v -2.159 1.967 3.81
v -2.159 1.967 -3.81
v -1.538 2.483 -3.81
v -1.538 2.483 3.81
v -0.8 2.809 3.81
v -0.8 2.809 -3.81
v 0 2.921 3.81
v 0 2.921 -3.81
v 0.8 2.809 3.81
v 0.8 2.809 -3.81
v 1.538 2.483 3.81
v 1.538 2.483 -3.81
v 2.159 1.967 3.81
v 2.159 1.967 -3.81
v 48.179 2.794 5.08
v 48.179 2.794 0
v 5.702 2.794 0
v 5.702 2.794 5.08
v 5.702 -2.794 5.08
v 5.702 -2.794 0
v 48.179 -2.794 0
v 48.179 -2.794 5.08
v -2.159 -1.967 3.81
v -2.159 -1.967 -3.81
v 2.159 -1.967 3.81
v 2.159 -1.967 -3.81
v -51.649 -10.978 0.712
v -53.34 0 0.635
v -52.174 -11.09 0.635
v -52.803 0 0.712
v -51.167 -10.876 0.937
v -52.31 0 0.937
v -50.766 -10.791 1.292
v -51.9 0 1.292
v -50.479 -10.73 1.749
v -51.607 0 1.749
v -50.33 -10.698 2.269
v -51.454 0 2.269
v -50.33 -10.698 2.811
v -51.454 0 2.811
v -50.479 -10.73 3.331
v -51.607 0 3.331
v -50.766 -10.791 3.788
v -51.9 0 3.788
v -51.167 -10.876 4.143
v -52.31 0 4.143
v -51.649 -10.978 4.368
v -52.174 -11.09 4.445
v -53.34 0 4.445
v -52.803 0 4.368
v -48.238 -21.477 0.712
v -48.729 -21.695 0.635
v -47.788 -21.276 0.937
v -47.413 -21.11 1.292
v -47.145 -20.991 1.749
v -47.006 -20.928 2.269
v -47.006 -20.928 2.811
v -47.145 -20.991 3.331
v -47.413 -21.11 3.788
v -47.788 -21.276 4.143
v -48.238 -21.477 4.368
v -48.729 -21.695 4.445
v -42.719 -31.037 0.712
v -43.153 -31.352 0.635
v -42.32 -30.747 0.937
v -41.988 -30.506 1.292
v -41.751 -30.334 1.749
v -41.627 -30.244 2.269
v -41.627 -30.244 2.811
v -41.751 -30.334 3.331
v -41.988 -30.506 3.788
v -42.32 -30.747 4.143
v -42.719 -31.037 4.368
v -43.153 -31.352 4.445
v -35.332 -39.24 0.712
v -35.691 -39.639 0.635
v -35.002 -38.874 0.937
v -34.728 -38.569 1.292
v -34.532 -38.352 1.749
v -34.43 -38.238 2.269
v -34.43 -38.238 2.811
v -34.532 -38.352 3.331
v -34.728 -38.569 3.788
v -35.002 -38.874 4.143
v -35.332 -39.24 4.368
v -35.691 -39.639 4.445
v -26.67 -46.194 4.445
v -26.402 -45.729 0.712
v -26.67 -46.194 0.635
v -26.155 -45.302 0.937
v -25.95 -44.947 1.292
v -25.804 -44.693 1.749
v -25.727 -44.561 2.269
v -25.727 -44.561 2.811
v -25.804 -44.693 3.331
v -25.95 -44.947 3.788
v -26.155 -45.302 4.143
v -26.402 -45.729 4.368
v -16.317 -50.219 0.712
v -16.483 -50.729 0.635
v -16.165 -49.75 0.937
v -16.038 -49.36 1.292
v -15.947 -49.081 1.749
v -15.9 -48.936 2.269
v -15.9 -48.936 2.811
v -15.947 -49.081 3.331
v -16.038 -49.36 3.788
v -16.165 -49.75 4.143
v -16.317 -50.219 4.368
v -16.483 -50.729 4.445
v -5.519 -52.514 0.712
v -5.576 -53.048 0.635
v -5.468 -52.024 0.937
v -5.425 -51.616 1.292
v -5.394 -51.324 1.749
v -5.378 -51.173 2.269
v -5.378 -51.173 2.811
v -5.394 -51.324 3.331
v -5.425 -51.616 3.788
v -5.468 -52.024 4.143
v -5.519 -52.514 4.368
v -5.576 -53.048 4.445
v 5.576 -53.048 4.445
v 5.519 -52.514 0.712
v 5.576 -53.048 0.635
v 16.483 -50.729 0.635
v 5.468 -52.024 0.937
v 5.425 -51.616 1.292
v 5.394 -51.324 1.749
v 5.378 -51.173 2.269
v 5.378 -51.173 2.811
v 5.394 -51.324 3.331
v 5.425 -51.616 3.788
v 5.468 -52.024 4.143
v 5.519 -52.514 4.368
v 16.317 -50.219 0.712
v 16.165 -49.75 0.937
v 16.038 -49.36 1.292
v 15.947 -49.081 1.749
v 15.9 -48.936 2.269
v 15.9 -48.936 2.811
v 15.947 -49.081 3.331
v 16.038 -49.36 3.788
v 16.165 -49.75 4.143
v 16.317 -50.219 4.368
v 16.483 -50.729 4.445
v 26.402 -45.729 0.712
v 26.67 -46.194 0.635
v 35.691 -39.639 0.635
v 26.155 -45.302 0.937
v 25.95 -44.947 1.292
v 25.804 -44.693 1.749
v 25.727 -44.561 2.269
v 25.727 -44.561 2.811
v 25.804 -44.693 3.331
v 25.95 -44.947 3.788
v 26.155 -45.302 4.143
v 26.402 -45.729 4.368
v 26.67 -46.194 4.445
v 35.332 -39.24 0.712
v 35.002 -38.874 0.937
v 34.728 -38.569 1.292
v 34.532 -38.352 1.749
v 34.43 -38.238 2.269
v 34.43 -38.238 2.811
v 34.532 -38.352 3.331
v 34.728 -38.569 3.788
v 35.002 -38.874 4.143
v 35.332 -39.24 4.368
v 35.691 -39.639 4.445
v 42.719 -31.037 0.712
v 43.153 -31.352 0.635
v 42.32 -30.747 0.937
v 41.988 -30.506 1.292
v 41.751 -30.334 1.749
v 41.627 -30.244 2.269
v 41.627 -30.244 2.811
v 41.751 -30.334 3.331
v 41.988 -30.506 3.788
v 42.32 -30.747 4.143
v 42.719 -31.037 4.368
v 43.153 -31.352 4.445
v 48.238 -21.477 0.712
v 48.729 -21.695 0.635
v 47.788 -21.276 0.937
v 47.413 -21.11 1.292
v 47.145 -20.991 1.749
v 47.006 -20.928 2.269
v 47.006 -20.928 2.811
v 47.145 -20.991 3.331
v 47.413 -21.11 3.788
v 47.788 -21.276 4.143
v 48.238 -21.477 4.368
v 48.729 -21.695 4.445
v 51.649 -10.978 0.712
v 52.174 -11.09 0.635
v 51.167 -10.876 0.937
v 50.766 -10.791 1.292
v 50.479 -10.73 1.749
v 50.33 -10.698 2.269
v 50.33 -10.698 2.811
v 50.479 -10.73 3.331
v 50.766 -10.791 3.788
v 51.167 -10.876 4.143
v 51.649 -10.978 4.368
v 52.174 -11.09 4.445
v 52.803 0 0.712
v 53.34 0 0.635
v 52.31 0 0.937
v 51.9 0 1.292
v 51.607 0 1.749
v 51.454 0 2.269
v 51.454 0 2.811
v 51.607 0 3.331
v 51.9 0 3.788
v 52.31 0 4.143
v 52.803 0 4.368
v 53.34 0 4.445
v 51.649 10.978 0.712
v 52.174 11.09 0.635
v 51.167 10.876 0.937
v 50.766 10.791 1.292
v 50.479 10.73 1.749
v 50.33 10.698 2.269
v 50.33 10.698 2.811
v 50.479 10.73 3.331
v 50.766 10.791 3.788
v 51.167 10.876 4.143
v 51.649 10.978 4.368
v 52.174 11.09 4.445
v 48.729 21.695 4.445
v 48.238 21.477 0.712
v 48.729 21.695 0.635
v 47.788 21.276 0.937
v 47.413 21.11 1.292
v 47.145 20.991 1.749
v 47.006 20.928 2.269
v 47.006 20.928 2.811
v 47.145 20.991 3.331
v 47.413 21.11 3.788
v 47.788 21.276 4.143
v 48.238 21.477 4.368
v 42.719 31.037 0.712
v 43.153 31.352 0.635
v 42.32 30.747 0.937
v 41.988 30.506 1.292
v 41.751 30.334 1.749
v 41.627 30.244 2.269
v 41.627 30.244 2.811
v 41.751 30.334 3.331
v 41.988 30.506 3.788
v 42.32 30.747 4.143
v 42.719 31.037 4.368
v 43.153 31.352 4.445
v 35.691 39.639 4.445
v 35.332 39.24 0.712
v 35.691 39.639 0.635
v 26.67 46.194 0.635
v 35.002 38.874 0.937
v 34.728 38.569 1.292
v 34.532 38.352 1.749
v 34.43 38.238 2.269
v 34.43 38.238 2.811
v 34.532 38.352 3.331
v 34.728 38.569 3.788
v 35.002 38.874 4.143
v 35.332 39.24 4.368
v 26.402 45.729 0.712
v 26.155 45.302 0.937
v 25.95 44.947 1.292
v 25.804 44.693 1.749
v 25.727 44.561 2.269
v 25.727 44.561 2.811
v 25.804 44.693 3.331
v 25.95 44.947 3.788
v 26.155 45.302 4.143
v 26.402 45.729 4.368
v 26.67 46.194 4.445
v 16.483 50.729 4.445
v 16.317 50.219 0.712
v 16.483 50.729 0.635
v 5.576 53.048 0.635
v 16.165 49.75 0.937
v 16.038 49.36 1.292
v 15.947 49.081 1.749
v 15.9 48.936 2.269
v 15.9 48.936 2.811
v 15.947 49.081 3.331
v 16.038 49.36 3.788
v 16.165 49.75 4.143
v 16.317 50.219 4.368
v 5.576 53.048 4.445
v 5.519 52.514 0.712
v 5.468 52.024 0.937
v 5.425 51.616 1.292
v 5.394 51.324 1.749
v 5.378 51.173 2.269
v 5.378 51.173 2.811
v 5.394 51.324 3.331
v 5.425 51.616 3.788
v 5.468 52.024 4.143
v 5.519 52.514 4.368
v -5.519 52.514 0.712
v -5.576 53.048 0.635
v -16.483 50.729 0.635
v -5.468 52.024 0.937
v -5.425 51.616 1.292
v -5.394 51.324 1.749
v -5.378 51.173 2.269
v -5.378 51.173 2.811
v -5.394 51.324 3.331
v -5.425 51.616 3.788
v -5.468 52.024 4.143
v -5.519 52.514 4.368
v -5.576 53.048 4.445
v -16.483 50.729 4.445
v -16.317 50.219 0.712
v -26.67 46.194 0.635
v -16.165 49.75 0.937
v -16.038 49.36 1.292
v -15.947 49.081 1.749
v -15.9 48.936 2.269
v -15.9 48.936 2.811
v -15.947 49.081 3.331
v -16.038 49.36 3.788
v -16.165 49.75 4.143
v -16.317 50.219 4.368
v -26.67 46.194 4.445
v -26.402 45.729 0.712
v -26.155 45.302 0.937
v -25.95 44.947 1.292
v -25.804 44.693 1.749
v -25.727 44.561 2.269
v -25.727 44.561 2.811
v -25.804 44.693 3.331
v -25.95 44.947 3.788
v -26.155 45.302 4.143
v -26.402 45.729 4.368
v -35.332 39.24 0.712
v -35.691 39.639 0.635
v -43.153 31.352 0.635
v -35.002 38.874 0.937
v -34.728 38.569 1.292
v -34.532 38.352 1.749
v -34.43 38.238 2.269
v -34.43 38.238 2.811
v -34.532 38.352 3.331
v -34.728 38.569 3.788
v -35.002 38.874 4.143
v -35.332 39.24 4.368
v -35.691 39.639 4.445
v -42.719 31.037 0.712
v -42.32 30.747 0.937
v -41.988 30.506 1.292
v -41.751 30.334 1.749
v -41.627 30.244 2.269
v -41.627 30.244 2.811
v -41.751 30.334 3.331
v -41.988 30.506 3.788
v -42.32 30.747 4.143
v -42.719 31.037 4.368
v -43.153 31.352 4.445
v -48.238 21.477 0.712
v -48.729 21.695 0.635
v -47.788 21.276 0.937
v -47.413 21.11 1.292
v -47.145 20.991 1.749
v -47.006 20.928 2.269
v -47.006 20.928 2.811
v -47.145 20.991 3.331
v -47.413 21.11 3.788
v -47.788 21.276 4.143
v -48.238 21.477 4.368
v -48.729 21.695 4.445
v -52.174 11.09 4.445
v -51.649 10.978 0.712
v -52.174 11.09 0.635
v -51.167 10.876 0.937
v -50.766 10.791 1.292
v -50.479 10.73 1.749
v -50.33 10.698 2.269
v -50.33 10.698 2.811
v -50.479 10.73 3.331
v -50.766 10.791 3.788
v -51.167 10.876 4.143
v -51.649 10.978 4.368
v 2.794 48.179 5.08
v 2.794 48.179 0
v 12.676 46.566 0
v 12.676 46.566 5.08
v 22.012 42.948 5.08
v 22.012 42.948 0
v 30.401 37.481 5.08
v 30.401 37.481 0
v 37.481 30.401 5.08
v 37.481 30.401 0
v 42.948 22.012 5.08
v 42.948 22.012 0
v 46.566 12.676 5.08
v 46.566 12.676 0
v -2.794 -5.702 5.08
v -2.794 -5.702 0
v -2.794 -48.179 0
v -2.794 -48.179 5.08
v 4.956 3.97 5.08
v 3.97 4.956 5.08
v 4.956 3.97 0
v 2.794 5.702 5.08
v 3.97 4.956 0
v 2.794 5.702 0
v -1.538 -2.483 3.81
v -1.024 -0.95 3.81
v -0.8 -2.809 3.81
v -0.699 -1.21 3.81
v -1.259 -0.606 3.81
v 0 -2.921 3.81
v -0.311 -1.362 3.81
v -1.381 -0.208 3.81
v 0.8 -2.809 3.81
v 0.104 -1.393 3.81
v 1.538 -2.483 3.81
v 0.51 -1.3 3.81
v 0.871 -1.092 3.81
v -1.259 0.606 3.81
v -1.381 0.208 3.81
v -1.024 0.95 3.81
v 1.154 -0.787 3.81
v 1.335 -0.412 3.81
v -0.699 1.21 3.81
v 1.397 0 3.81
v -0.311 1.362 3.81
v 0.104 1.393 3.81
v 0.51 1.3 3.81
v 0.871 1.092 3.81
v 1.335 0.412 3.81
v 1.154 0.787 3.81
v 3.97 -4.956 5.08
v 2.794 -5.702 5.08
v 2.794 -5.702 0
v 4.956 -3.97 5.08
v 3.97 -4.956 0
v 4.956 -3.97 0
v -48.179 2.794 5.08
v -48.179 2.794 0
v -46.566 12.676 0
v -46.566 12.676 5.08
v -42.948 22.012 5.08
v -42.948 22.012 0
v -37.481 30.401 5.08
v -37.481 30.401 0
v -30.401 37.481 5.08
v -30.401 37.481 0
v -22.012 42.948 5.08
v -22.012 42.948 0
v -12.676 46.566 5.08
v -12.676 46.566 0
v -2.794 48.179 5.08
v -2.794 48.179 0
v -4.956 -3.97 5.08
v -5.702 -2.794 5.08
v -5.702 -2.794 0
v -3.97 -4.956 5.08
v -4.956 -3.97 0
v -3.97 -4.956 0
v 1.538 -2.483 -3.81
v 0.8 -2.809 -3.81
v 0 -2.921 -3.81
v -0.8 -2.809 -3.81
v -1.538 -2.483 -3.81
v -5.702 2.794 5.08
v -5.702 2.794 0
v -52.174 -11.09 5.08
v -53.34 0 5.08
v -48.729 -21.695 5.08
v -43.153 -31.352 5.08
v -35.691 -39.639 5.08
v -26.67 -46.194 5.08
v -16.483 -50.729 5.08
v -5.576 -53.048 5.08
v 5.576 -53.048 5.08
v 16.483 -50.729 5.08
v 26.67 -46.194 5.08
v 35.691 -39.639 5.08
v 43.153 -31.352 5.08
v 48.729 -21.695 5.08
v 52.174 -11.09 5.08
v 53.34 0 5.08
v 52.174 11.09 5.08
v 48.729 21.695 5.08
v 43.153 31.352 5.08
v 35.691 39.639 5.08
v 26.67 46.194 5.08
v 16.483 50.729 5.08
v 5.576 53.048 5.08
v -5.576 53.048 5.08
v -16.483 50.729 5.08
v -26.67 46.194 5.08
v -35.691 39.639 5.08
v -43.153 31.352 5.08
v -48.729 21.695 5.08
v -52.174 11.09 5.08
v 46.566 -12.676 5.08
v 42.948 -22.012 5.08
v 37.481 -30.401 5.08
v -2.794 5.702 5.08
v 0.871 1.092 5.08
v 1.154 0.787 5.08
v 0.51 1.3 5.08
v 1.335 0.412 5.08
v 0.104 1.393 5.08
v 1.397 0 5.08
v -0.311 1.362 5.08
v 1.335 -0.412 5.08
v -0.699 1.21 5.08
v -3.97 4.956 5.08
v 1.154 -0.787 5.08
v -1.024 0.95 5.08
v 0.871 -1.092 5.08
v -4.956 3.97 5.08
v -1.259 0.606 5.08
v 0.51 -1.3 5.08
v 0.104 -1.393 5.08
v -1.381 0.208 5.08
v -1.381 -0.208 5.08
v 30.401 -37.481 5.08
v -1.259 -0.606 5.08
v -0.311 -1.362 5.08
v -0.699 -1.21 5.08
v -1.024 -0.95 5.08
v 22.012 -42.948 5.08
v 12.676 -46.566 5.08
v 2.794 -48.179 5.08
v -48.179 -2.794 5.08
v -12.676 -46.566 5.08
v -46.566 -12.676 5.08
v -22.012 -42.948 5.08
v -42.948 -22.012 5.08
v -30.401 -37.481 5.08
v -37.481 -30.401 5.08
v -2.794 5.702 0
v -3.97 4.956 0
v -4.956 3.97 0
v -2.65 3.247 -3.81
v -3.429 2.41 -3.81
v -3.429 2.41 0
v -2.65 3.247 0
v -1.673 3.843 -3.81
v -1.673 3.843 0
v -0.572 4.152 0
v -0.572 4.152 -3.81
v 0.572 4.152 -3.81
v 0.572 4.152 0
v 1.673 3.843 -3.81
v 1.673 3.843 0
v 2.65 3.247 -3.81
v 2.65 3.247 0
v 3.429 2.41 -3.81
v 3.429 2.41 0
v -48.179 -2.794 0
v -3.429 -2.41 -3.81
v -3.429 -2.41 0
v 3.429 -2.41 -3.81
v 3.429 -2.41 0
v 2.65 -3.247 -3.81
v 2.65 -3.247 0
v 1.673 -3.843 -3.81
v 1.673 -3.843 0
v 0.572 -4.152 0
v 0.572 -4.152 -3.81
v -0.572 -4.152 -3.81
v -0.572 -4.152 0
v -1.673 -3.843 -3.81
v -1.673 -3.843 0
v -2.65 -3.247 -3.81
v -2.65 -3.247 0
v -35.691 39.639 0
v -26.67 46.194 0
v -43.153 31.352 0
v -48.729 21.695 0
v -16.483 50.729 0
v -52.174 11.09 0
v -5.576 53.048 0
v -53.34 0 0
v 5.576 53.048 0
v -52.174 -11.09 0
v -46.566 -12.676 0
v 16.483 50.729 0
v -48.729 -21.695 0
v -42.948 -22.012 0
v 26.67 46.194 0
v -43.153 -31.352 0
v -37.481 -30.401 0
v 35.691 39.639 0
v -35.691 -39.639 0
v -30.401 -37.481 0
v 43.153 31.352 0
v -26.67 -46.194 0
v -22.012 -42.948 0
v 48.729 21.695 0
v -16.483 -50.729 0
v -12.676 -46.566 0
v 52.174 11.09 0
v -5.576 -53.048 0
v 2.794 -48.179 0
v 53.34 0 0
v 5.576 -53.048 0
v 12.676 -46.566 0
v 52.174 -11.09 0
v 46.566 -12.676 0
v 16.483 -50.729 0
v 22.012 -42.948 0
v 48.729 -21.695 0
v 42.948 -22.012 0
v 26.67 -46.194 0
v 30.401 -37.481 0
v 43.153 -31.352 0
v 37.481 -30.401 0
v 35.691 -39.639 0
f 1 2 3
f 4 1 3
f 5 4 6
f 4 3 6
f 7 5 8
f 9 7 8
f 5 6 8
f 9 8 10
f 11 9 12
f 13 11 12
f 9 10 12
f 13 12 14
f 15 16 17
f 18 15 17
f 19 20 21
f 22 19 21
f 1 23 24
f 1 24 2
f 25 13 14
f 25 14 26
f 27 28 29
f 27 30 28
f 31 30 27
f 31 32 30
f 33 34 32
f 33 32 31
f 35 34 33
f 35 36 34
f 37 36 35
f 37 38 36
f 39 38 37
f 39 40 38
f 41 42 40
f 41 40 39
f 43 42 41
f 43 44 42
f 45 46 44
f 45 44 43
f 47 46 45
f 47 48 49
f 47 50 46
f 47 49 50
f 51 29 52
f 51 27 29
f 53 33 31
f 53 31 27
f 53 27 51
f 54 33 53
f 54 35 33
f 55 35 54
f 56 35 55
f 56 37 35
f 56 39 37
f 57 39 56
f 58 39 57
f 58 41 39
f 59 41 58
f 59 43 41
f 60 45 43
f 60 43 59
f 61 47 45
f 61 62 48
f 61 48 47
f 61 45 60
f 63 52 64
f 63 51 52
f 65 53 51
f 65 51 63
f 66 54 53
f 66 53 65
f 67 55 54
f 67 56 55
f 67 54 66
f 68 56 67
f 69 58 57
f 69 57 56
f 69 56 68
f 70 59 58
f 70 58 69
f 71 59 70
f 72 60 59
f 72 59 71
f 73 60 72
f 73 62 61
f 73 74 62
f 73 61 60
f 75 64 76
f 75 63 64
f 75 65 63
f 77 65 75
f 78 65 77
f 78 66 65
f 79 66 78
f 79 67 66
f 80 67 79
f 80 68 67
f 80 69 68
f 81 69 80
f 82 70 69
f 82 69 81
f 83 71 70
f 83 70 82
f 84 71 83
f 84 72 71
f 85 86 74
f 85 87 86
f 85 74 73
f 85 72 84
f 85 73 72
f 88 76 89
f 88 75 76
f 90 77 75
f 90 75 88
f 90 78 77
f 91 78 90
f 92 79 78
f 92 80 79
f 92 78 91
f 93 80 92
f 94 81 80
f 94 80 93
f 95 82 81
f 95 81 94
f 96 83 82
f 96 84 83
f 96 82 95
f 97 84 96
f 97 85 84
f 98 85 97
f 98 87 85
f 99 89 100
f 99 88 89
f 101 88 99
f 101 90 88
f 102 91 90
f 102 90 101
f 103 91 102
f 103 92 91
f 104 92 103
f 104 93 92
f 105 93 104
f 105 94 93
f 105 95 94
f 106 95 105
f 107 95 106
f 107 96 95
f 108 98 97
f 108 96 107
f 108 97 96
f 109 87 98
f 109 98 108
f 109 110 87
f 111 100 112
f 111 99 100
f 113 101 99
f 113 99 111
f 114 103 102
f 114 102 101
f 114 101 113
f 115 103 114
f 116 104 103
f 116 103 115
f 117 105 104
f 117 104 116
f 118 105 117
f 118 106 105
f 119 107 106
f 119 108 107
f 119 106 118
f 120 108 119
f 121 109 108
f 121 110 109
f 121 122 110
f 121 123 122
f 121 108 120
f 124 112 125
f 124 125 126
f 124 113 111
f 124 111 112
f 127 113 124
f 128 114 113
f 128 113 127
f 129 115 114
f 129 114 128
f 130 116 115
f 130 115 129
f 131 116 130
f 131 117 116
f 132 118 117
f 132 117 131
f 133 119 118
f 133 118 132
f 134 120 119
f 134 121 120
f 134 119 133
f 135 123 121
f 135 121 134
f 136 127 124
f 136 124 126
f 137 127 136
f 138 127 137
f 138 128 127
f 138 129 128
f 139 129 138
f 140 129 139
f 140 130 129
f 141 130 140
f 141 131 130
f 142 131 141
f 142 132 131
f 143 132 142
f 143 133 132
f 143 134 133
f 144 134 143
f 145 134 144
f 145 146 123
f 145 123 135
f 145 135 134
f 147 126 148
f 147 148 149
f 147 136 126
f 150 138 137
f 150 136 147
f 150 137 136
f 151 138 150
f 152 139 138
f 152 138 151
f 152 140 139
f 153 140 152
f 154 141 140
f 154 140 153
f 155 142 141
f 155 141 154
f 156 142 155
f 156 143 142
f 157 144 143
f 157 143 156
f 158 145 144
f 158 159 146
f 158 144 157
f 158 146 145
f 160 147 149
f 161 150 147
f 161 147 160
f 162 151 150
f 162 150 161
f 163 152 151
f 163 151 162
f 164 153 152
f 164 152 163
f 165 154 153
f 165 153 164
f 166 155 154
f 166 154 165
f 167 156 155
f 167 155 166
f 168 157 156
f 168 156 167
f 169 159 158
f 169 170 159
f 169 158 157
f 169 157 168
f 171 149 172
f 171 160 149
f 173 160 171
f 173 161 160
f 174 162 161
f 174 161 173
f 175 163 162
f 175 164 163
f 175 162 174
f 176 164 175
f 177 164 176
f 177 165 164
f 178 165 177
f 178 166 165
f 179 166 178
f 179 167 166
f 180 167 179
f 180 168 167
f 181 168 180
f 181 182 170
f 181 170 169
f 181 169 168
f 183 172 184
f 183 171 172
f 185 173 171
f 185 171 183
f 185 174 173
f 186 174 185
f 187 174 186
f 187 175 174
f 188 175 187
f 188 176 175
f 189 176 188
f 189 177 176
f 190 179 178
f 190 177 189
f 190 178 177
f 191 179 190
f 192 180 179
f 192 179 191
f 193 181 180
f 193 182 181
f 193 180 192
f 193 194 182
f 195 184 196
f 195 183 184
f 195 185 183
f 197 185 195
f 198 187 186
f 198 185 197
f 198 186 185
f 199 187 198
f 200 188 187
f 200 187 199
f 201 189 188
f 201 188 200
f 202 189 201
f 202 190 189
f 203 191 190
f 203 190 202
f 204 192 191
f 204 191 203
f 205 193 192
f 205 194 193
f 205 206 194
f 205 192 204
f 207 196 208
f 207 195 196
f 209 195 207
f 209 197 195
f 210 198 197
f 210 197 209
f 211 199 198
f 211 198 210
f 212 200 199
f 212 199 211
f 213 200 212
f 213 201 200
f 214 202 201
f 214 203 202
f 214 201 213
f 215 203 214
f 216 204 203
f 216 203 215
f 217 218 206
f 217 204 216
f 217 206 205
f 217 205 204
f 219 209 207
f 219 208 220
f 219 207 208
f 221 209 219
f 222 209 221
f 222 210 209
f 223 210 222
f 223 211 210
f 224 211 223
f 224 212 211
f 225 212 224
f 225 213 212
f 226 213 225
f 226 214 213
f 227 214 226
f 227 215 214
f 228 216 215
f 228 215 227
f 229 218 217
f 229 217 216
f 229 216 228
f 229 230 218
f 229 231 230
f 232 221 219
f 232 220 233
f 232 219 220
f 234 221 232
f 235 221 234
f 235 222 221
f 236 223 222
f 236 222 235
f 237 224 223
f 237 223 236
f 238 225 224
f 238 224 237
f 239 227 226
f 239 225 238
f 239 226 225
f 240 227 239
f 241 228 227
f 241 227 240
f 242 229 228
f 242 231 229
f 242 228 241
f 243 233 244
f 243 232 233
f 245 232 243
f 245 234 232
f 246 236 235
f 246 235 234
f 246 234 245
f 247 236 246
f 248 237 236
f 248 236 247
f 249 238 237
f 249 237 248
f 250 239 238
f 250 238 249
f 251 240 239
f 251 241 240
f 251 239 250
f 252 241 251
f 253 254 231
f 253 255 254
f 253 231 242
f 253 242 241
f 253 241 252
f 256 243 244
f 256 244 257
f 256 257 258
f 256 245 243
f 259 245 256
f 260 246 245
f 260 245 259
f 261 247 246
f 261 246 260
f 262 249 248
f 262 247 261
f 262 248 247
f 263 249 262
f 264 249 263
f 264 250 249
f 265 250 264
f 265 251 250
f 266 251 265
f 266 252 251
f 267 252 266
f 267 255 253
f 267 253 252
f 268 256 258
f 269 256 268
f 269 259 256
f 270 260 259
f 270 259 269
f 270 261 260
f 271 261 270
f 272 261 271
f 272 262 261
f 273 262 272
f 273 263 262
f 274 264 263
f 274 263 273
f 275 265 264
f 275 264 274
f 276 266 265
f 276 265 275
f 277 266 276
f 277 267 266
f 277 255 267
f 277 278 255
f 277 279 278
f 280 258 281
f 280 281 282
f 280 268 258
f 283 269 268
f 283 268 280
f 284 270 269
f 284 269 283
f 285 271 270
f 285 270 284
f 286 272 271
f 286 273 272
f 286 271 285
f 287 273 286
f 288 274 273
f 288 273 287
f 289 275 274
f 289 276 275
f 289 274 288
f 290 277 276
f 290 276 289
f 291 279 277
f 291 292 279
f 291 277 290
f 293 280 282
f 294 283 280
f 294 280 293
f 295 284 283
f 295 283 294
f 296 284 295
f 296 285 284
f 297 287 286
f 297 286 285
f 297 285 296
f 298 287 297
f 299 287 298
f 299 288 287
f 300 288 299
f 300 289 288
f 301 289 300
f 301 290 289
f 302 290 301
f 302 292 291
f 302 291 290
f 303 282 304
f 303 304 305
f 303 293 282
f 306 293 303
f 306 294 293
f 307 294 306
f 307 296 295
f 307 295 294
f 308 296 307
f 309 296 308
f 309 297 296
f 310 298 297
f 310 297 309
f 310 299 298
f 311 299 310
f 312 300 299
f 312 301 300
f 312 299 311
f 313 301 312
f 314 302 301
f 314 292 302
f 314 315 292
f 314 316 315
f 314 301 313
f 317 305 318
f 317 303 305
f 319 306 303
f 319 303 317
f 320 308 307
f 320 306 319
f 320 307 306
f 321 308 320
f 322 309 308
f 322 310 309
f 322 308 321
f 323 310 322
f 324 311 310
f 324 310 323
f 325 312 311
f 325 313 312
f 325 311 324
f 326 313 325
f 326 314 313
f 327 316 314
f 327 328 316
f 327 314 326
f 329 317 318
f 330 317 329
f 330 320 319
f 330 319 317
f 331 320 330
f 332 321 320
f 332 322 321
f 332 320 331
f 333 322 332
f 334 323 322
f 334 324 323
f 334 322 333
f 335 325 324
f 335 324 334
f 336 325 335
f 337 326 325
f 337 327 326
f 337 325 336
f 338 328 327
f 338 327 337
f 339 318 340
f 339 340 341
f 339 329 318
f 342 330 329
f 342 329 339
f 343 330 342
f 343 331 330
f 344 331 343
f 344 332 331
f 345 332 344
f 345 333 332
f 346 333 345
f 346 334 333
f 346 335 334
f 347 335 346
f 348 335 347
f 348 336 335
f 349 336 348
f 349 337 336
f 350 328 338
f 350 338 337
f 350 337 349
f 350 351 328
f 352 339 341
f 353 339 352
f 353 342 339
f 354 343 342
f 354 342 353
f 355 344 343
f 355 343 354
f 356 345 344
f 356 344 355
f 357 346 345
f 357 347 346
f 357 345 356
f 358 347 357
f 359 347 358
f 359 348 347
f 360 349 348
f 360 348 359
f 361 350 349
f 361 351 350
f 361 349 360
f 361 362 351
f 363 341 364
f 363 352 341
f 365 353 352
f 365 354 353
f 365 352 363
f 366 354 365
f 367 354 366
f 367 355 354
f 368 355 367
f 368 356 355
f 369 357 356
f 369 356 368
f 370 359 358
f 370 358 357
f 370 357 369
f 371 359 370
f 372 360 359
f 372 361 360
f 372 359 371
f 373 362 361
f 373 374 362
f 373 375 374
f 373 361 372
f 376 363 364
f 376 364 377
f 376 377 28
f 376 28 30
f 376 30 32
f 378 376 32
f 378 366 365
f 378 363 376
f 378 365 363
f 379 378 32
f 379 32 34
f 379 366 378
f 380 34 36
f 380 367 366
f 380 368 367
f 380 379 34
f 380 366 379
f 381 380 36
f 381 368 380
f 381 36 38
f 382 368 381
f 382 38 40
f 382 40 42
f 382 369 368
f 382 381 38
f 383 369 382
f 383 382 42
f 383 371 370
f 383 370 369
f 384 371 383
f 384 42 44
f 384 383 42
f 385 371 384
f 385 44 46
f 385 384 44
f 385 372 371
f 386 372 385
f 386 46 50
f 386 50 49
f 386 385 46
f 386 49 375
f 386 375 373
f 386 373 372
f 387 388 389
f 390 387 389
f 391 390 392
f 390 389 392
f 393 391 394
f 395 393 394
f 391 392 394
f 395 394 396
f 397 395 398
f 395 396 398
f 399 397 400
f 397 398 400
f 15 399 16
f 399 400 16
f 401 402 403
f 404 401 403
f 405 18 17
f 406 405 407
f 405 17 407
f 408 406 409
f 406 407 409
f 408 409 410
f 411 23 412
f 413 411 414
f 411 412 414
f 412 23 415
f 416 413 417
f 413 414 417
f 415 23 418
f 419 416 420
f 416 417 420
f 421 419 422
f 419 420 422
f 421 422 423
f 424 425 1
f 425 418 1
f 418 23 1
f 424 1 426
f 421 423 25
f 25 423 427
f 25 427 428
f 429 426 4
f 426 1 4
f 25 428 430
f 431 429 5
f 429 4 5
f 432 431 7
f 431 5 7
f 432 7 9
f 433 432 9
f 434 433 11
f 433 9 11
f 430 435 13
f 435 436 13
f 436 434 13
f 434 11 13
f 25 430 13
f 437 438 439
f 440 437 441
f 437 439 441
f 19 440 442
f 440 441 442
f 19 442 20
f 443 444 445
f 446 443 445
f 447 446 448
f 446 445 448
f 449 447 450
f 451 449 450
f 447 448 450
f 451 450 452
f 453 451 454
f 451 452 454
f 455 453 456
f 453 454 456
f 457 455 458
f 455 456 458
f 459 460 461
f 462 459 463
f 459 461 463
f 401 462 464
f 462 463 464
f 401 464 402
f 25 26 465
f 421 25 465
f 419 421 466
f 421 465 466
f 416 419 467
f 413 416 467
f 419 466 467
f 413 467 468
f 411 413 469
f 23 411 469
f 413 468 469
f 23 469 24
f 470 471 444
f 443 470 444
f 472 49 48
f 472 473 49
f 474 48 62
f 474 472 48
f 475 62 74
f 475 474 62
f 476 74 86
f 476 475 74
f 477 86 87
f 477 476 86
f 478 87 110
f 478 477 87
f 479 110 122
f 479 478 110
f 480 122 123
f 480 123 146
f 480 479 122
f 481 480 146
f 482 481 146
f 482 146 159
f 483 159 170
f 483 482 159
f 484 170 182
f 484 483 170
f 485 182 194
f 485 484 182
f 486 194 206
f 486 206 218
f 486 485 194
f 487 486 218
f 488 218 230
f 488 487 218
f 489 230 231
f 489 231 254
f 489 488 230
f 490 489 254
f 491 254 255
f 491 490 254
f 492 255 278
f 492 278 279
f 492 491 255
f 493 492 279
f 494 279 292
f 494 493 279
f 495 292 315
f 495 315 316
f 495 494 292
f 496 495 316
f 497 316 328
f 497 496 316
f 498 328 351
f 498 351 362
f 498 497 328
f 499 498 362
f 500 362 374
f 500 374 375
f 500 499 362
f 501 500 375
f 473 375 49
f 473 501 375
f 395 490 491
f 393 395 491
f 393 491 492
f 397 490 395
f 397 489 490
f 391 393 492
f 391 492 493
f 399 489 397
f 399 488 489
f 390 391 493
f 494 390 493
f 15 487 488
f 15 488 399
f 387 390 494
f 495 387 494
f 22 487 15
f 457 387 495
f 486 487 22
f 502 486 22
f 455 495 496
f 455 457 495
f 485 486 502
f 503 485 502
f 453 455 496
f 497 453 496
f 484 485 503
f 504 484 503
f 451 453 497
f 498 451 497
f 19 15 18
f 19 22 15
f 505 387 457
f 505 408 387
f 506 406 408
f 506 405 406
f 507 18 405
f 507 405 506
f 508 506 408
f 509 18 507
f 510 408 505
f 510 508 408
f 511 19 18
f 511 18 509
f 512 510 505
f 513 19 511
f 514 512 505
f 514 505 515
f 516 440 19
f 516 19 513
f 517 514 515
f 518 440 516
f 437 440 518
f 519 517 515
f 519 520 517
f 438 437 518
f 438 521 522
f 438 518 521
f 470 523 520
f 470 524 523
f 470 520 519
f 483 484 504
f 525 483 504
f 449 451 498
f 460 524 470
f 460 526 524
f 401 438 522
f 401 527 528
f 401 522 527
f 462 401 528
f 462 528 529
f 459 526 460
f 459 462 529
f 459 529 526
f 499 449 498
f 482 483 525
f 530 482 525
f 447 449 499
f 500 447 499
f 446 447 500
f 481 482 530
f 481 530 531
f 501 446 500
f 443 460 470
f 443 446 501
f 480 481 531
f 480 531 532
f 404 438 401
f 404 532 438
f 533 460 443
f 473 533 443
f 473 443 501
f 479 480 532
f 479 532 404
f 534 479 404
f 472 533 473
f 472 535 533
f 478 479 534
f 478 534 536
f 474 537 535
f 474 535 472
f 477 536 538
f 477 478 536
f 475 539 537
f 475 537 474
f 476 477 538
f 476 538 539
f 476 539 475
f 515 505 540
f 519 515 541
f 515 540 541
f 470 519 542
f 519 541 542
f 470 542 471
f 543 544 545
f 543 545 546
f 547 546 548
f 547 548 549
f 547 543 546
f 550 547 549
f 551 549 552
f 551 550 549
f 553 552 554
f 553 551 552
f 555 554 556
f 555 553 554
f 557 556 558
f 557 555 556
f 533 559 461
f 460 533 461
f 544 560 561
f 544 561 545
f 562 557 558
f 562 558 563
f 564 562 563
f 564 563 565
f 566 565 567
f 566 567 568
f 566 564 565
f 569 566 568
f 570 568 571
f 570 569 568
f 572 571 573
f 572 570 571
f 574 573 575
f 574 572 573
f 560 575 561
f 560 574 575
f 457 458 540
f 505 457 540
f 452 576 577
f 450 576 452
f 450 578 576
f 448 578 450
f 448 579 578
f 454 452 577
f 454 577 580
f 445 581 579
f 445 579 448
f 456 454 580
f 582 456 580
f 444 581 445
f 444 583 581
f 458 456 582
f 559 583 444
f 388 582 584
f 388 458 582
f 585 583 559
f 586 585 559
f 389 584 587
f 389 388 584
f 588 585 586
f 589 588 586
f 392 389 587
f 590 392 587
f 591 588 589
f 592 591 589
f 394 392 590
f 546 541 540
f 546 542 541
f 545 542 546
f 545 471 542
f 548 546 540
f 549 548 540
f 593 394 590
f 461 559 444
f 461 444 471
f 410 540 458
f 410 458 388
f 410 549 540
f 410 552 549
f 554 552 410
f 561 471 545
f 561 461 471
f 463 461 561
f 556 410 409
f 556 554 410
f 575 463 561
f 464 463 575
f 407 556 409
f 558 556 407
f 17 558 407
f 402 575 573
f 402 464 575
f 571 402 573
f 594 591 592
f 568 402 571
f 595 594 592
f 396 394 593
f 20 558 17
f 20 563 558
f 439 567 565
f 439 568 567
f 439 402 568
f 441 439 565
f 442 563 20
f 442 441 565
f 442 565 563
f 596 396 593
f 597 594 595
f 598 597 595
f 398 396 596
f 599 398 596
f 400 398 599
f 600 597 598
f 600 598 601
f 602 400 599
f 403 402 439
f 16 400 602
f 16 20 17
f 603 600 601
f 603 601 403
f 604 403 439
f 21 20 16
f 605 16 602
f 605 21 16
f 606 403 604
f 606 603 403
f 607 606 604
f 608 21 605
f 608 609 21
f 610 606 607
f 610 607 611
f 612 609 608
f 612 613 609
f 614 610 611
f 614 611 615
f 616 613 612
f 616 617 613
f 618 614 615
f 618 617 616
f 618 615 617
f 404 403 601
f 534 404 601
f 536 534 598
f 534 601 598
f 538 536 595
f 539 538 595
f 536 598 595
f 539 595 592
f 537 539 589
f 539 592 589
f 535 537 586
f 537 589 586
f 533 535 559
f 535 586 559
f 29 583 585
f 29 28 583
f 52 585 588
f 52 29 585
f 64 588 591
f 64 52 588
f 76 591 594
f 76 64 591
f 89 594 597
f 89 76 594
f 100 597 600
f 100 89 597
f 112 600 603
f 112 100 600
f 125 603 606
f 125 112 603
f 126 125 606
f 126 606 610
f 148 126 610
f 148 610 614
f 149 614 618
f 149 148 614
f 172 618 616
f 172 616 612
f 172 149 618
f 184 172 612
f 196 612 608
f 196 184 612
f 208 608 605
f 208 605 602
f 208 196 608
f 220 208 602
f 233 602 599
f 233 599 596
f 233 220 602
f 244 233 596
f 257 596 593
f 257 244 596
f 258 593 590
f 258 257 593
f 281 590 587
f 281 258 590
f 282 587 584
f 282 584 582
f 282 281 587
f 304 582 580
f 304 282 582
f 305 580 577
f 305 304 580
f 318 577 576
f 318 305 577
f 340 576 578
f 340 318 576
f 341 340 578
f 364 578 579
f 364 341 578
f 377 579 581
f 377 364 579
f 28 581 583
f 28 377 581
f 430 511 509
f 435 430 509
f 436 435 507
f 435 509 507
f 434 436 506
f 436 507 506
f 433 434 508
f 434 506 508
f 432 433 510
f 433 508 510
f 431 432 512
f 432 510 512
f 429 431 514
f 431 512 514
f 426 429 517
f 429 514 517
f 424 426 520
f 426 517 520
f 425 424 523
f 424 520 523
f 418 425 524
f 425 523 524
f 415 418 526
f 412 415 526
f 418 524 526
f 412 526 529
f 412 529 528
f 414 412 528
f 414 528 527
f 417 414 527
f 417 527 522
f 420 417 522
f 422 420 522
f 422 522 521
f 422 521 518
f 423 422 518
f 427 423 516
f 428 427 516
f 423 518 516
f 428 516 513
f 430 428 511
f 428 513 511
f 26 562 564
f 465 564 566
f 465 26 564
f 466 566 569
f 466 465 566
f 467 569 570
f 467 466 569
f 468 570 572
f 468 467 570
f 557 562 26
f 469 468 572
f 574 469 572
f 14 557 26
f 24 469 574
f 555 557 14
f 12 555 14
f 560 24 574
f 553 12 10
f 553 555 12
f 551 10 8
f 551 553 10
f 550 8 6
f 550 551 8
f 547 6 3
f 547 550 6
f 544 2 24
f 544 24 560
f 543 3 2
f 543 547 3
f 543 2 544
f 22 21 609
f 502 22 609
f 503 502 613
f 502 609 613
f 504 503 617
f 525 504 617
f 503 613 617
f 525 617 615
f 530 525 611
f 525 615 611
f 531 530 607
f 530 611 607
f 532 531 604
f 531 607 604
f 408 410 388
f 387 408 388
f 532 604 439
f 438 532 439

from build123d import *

# Parameters (mm, degrees)
CUT_EXTRUDE2_DEPTH  = 76.605010416
CUT_EXTRUDE3_DEPTH  = 76.605010416
BOSS_EXTRUDE1_START = 3.81
BOSS_EXTRUDE1_DEPTH = 3.81
SKETCH8_R           = 3.81
SKETCH8_R_2         = 1.397
BOSS_EXTRUDE2_DEPTH = 1.27


with BuildPart() as part:
    # Sketch1 → Revolve1 (revolve)
    with BuildSketch(Plane(origin=(0, 0, 0), x_dir=(1, 0, 0), z_dir=(0, 1, 0))):
        with BuildLine():
            Line((-53.34, 0), (-53.34, -0.635))
            ThreePointArc((-53.34, -0.635), (-51.435, -2.54), (-53.34, -4.445))
            Line((-53.34, -4.445), (-53.34, -5.08))
            Line((-53.34, -5.08), (0, -5.08))
            Line((0, -5.08), (0, 0))
            Line((0, 0), (-53.34, 0))
        make_face()
    revolve(axis=Axis((0, 0, 0), (0, 0, 1)))

    # Sketch3 → Cut-Extrude2 (cut, through all)
    with BuildSketch(Plane(origin=(0, 0, 0), x_dir=(-1, 0, 0), z_dir=(0, 0, -1))):
        with BuildLine():
            Line((2.794, 48.179053166), (2.794, 5.702285857))
            ThreePointArc((2.794, 5.702285857), (4.490128061, 4.490128061), (5.702285857, 2.794))
            Line((5.702285857, 2.794), (48.179053166, 2.794))
            ThreePointArc((48.179053166, 2.794), (34.12497326, 34.12497326), (2.794, 48.179053166))
        make_face()
        with BuildLine():
            Line((2.794, -5.702285857), (2.794, -48.179053166))
            ThreePointArc((2.794, -48.179053166), (34.12497326, -34.12497326), (48.179053166, -2.794))
            Line((48.179053166, -2.794), (5.702285857, -2.794))
            ThreePointArc((5.702285857, -2.794), (4.490128061, -4.490128061), (2.794, -5.702285857))
        make_face()
        with BuildLine():
            Line((-5.702285857, -2.794), (-48.179053166, -2.794))
            ThreePointArc((-48.179053166, -2.794), (-34.12497326, -34.12497326), (-2.794, -48.179053166))
            Line((-2.794, -48.179053166), (-2.794, -5.702285857))
            ThreePointArc((-2.794, -5.702285857), (-4.490128061, -4.490128061), (-5.702285857, -2.794))
        make_face()
        with BuildLine():
            Line((-2.794, 5.702285857), (-2.794, 48.179053166))
            ThreePointArc((-2.794, 48.179053166), (-34.12497326, 34.12497326), (-48.179053166, 2.794))
            Line((-48.179053166, 2.794), (-5.702285857, 2.794))
            ThreePointArc((-5.702285857, 2.794), (-4.490128061, 4.490128061), (-2.794, 5.702285857))
        make_face()
    extrude(amount=-CUT_EXTRUDE2_DEPTH, mode=Mode.SUBTRACT)

    # Sketch6 → Cut-Extrude3 (cut, through all)
    with BuildSketch(Plane(origin=(0, 0, 0), x_dir=(-1, 0, 0), z_dir=(0, 0, -1))):
        with BuildLine():
            Line((-2.159, 1.96747554), (-2.159, -1.96747554))
            ThreePointArc((-2.159, -1.96747554), (0, -2.921), (2.159, -1.96747554))
            Line((2.159, -1.96747554), (2.159, 1.96747554))
            ThreePointArc((2.159, 1.96747554), (0, 2.921), (-2.159, 1.96747554))
        make_face()
    extrude(amount=-CUT_EXTRUDE3_DEPTH, mode=Mode.SUBTRACT)

    # Sketch7 → Boss-Extrude1 (add)
    with BuildSketch(Plane(origin=(0, 0, 0), x_dir=(-1, 0, 0), z_dir=(0, 0, -1)).offset(BOSS_EXTRUDE1_START)):
        with BuildLine():
            Line((3.429, -2.409655577), (3.429, 2.409655577))
            ThreePointArc((3.429, 2.409655577), (0, 4.191), (-3.429, 2.409655577))
            Line((-3.429, 2.409655577), (-3.429, -2.409655577))
            ThreePointArc((-3.429, -2.409655577), (0, -4.191), (3.429, -2.409655577))
        make_face()
        with BuildLine():
            Line((2.159, -1.96747554), (2.159, 1.96747554))
            ThreePointArc((2.159, 1.96747554), (0, 2.921), (-2.159, 1.96747554))
            Line((-2.159, 1.96747554), (-2.159, -1.96747554))
            ThreePointArc((-2.159, -1.96747554), (0, -2.921), (2.159, -1.96747554))
        make_face(mode=Mode.SUBTRACT)
    extrude(amount=-BOSS_EXTRUDE1_DEPTH)

    # Sketch8 → Boss-Extrude2 (add)
    with BuildSketch(Plane.XY.offset(5.08)):
        Circle(SKETCH8_R)
        Circle(SKETCH8_R_2, mode=Mode.SUBTRACT)
    extrude(amount=-BOSS_EXTRUDE2_DEPTH)


solid = part.part
